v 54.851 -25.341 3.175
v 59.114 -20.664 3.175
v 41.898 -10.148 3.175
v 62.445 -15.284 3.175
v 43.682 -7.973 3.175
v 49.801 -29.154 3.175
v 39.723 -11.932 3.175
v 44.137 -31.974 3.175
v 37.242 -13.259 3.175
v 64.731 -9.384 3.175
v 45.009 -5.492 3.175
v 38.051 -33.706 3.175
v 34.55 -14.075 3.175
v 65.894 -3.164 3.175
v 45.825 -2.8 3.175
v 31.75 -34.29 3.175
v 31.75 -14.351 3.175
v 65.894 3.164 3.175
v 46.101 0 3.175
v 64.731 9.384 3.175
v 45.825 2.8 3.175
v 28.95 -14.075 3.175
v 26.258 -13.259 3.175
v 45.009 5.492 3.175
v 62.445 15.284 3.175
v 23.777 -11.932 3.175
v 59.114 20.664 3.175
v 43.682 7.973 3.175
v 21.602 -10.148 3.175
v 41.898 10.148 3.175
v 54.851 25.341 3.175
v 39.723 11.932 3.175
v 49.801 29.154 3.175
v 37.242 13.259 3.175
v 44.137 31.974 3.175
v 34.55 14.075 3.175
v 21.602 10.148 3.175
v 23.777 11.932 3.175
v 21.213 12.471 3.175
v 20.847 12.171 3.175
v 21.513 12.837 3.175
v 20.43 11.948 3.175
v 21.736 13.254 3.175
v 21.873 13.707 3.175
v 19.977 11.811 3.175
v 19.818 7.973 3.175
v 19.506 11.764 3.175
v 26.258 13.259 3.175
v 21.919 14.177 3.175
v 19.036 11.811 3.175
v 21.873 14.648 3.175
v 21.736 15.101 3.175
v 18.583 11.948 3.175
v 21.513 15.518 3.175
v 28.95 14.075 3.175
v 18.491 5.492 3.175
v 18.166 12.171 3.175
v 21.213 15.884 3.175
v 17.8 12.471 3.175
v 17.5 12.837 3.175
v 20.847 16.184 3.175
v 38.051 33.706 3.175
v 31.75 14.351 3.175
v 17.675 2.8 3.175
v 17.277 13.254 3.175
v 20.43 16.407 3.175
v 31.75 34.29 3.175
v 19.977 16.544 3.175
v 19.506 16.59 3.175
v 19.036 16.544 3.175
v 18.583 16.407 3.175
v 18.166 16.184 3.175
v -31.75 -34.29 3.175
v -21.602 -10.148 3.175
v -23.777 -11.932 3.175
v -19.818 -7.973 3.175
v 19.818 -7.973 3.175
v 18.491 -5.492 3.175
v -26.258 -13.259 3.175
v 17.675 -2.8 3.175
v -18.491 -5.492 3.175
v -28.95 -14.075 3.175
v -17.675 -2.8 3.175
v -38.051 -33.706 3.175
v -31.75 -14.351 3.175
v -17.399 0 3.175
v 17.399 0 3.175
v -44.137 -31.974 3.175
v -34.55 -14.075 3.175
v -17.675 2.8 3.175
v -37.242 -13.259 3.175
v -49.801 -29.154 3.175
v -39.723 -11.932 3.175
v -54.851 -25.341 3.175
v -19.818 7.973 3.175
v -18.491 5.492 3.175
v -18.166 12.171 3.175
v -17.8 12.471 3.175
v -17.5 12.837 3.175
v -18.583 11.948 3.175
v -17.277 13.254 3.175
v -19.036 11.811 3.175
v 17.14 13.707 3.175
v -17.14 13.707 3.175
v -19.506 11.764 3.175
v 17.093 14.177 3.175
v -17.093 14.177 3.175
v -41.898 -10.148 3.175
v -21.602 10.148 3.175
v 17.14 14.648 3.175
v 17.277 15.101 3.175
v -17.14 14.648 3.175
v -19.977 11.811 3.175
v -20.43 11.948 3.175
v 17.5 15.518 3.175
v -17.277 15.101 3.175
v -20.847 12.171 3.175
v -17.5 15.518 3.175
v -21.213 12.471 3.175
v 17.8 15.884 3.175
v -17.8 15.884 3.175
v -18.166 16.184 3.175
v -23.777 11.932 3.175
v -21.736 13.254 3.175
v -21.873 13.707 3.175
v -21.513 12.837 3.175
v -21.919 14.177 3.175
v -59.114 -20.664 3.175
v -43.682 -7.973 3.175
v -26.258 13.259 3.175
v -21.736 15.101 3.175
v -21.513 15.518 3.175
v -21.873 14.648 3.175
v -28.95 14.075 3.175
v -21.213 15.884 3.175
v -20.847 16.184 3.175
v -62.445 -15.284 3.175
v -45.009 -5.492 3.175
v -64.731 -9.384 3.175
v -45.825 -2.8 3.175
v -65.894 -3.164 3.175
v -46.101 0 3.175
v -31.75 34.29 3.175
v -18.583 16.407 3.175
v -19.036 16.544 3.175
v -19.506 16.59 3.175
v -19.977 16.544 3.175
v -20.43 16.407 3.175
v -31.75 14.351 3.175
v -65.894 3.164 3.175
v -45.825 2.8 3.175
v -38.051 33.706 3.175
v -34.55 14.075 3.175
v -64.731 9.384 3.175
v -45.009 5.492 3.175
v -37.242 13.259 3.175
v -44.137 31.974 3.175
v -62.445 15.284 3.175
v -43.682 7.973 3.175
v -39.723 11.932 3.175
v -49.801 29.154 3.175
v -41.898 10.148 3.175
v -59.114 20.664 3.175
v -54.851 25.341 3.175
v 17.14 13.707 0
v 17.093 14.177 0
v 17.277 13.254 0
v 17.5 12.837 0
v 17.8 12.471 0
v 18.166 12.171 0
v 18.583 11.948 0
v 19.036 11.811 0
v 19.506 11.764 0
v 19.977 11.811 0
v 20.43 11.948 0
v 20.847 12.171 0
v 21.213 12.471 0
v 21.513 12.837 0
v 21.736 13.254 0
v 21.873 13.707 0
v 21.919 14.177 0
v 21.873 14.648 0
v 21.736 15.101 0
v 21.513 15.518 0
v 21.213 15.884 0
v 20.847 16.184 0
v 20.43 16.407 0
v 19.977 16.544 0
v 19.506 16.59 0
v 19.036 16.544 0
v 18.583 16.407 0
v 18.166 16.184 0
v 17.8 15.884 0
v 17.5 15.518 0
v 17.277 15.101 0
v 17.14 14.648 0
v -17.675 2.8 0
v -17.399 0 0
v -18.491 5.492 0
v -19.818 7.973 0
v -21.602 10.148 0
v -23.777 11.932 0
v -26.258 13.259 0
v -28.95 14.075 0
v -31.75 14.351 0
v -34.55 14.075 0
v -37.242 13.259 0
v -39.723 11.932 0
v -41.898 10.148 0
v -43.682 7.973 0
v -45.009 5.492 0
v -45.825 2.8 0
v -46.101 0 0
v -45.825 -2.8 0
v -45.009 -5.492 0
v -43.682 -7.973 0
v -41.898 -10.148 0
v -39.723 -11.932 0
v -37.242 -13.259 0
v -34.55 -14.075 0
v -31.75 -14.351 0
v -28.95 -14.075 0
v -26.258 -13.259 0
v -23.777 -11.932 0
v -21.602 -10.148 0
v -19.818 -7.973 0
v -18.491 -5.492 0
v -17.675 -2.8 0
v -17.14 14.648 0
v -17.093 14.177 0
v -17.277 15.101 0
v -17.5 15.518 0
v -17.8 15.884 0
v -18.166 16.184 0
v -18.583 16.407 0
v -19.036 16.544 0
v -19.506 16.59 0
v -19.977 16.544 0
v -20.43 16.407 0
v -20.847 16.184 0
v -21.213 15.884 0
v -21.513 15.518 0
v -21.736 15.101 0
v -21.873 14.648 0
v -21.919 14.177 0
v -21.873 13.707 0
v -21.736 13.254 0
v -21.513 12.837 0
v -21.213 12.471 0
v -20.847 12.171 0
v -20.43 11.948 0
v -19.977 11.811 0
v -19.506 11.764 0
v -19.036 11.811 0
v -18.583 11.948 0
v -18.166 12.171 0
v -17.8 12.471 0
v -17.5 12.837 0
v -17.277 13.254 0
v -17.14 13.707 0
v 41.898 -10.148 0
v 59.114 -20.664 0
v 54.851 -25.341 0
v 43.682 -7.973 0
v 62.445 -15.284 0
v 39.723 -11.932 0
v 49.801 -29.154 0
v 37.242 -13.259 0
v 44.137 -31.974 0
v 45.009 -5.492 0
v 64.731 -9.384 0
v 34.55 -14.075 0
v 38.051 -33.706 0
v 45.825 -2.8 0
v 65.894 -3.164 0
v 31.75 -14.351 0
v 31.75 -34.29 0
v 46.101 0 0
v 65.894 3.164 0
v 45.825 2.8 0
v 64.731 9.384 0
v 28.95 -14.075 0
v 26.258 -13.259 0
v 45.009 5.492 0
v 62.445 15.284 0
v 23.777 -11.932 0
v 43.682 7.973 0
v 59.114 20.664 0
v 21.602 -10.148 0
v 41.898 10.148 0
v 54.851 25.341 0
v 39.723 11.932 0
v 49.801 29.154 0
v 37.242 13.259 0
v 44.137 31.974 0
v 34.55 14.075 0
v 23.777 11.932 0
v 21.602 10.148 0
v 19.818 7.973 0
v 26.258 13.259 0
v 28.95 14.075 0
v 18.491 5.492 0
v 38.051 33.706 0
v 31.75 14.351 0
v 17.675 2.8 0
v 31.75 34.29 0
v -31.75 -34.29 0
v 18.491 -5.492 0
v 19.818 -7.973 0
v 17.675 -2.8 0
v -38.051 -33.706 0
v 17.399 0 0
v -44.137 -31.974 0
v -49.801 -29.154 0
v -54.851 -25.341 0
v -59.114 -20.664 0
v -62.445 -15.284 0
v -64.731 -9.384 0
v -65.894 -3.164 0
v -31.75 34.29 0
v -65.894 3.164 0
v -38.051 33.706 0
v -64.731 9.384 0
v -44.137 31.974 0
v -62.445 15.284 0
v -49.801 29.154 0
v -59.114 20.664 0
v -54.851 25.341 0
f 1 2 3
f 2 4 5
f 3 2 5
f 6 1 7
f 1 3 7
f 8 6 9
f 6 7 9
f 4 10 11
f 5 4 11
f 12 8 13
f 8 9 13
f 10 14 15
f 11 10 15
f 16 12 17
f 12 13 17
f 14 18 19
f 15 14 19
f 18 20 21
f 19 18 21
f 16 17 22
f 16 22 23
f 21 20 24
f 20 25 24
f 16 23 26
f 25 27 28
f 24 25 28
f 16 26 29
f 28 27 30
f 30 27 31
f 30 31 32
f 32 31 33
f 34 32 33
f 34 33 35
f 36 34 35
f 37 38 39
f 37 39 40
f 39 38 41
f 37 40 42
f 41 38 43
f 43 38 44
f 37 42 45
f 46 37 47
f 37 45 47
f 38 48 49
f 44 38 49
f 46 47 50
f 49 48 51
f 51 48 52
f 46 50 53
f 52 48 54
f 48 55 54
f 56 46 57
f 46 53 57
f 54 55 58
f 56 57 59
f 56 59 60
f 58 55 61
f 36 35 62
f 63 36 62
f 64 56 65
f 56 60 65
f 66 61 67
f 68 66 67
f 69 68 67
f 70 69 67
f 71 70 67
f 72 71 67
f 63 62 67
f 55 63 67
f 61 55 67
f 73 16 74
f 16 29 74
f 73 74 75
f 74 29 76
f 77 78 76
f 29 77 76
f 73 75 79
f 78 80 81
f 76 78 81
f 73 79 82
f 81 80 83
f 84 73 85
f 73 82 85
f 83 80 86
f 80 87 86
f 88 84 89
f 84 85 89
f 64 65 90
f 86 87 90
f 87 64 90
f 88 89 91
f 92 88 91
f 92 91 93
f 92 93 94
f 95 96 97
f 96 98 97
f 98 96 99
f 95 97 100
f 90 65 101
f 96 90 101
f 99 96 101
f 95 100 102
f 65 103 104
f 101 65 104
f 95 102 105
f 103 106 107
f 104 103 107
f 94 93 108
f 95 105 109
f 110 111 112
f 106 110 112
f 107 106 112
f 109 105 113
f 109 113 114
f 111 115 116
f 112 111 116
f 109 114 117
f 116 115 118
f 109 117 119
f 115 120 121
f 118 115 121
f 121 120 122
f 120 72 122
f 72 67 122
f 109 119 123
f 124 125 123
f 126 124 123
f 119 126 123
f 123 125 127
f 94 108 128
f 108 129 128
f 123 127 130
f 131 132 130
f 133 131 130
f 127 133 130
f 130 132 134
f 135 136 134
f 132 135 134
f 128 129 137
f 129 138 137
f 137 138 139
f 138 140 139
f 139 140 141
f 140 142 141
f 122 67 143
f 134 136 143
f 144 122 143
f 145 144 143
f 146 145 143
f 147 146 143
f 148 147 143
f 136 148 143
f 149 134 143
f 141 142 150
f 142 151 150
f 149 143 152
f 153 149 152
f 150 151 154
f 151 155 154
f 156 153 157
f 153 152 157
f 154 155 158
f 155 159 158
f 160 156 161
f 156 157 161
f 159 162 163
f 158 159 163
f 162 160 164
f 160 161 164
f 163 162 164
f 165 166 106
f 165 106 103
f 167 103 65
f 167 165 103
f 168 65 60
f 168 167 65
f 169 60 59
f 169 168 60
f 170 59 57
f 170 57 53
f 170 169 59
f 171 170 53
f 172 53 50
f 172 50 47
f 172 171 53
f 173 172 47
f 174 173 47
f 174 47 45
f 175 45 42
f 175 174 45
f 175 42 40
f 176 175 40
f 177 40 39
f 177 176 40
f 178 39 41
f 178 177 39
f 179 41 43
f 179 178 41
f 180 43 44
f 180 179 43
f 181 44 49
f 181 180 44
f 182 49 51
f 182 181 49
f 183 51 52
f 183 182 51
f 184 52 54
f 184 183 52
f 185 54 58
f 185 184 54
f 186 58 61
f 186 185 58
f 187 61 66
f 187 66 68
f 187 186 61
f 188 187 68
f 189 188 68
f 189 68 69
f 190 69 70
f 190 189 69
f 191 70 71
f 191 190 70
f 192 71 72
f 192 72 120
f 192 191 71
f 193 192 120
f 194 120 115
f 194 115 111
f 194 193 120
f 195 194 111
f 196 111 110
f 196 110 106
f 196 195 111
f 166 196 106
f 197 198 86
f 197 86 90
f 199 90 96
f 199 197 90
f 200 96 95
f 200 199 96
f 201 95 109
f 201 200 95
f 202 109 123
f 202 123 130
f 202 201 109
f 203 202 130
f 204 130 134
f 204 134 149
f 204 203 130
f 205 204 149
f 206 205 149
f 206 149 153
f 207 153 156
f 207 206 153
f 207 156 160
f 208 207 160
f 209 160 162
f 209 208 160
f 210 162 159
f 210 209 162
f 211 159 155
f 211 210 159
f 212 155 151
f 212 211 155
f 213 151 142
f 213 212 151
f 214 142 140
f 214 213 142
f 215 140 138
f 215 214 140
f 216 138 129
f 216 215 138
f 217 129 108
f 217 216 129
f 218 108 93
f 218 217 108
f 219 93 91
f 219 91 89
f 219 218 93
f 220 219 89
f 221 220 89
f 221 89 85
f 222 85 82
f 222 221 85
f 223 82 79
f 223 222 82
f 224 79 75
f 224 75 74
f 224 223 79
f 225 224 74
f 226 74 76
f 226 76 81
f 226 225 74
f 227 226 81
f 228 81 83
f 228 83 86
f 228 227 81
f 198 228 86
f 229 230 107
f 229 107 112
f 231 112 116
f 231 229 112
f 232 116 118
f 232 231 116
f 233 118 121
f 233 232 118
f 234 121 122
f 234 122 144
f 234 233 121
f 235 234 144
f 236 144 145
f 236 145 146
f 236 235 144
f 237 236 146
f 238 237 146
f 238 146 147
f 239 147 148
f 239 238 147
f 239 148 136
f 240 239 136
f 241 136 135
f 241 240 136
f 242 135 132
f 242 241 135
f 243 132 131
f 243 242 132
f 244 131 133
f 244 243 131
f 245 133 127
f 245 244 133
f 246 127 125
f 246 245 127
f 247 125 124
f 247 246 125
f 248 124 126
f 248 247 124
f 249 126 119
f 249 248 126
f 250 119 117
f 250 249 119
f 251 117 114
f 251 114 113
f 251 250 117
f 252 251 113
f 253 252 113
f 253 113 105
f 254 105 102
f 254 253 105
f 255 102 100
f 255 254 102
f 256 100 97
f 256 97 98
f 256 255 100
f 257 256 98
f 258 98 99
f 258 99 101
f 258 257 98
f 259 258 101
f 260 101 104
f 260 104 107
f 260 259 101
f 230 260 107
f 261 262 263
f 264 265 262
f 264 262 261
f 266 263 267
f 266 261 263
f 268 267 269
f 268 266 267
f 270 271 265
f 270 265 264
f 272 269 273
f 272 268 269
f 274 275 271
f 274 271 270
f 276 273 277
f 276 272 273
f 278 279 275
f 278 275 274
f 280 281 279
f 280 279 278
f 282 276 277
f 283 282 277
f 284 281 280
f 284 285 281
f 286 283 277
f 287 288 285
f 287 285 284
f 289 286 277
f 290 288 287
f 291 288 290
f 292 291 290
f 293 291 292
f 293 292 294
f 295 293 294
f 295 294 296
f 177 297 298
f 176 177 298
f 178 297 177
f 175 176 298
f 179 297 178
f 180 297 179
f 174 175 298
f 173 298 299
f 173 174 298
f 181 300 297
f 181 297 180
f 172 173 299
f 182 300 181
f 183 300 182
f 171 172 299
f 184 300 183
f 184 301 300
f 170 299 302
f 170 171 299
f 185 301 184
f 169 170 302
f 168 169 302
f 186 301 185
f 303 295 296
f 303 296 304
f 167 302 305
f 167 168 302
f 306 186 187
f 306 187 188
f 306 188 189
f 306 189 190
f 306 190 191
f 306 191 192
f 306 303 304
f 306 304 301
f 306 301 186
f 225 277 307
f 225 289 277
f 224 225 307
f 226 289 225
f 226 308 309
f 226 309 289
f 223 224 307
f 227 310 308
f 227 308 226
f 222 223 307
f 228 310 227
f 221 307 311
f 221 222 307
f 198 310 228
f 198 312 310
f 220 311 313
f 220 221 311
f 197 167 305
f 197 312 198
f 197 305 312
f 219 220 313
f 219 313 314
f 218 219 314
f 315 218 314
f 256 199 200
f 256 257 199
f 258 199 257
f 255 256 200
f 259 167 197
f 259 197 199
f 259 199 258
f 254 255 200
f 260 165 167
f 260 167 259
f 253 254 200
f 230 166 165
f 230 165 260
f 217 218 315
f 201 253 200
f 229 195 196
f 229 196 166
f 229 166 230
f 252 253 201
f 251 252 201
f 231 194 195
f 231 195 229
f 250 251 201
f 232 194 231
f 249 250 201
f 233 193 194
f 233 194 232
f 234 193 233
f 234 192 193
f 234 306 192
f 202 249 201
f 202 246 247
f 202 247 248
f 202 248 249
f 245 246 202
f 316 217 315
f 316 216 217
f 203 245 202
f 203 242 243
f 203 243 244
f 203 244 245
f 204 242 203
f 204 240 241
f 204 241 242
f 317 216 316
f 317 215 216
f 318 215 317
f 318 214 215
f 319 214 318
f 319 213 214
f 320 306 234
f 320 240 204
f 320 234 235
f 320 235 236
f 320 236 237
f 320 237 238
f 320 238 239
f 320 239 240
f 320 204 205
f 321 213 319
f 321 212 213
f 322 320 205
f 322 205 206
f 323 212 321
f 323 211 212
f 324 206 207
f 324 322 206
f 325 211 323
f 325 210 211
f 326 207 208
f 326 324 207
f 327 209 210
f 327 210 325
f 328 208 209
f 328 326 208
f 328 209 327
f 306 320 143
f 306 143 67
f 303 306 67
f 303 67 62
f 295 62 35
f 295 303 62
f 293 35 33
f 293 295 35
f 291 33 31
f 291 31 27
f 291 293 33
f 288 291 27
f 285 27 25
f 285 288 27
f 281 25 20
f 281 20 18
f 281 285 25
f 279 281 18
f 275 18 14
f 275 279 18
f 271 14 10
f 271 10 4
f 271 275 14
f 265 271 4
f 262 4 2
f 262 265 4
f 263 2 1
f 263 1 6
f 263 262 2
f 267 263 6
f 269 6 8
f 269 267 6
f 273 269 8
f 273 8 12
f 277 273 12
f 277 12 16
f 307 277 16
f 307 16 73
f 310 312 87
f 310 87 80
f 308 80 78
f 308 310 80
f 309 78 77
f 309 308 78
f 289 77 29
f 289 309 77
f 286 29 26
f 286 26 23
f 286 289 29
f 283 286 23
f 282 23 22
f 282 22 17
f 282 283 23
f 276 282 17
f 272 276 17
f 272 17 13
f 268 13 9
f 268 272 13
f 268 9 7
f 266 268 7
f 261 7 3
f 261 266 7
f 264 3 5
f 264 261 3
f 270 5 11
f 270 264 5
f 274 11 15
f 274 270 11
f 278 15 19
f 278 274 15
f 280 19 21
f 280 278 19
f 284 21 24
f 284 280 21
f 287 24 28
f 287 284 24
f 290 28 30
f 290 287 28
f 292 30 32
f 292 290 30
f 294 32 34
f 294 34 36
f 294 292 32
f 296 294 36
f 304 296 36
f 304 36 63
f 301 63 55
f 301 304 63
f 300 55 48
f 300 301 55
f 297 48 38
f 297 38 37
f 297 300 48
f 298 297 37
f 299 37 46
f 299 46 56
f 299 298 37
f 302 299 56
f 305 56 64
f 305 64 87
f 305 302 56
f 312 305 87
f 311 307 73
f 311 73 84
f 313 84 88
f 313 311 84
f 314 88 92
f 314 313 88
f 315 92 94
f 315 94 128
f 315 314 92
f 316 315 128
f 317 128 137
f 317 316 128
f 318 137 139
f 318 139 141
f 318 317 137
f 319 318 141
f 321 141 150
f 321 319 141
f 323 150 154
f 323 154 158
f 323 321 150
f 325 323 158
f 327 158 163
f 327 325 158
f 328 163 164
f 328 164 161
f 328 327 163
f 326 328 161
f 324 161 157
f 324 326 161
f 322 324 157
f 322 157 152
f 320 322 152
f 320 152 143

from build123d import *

# Parameters (mm, degrees)
SKETCH1_R           = 14.351
SKETCH1_R_2         = 2.413
BOSS_EXTRUDE1_DEPTH = 3.175


with BuildPart() as part:
    # Sketch1 → Boss-Extrude1 (new body)
    with BuildSketch(Plane.XY):
        with BuildLine():
            Line((-31.75, 34.29), (31.75, 34.29))
            ThreePointArc((31.75, 34.29), (66.04, 0), (31.75, -34.29))
            Line((31.75, -34.29), (-31.75, -34.29))
            ThreePointArc((-31.75, -34.29), (-66.04, 0), (-31.75, 34.29))
        make_face()
        with Locations((-31.75, 0)):
            Circle(SKETCH1_R, mode=Mode.SUBTRACT)
        with Locations(Location((31.75, 0, 0), (0, 0, 180))):
            Circle(SKETCH1_R, mode=Mode.SUBTRACT)
        with Locations((-19.506383886, 14.177461716)):
            Circle(SKETCH1_R_2, mode=Mode.SUBTRACT)
        with Locations(Location((19.506383886, 14.177461716, 0), (0, 0, 180))):
            Circle(SKETCH1_R_2, mode=Mode.SUBTRACT)
    extrude(amount=BOSS_EXTRUDE1_DEPTH)


solid = part.part
